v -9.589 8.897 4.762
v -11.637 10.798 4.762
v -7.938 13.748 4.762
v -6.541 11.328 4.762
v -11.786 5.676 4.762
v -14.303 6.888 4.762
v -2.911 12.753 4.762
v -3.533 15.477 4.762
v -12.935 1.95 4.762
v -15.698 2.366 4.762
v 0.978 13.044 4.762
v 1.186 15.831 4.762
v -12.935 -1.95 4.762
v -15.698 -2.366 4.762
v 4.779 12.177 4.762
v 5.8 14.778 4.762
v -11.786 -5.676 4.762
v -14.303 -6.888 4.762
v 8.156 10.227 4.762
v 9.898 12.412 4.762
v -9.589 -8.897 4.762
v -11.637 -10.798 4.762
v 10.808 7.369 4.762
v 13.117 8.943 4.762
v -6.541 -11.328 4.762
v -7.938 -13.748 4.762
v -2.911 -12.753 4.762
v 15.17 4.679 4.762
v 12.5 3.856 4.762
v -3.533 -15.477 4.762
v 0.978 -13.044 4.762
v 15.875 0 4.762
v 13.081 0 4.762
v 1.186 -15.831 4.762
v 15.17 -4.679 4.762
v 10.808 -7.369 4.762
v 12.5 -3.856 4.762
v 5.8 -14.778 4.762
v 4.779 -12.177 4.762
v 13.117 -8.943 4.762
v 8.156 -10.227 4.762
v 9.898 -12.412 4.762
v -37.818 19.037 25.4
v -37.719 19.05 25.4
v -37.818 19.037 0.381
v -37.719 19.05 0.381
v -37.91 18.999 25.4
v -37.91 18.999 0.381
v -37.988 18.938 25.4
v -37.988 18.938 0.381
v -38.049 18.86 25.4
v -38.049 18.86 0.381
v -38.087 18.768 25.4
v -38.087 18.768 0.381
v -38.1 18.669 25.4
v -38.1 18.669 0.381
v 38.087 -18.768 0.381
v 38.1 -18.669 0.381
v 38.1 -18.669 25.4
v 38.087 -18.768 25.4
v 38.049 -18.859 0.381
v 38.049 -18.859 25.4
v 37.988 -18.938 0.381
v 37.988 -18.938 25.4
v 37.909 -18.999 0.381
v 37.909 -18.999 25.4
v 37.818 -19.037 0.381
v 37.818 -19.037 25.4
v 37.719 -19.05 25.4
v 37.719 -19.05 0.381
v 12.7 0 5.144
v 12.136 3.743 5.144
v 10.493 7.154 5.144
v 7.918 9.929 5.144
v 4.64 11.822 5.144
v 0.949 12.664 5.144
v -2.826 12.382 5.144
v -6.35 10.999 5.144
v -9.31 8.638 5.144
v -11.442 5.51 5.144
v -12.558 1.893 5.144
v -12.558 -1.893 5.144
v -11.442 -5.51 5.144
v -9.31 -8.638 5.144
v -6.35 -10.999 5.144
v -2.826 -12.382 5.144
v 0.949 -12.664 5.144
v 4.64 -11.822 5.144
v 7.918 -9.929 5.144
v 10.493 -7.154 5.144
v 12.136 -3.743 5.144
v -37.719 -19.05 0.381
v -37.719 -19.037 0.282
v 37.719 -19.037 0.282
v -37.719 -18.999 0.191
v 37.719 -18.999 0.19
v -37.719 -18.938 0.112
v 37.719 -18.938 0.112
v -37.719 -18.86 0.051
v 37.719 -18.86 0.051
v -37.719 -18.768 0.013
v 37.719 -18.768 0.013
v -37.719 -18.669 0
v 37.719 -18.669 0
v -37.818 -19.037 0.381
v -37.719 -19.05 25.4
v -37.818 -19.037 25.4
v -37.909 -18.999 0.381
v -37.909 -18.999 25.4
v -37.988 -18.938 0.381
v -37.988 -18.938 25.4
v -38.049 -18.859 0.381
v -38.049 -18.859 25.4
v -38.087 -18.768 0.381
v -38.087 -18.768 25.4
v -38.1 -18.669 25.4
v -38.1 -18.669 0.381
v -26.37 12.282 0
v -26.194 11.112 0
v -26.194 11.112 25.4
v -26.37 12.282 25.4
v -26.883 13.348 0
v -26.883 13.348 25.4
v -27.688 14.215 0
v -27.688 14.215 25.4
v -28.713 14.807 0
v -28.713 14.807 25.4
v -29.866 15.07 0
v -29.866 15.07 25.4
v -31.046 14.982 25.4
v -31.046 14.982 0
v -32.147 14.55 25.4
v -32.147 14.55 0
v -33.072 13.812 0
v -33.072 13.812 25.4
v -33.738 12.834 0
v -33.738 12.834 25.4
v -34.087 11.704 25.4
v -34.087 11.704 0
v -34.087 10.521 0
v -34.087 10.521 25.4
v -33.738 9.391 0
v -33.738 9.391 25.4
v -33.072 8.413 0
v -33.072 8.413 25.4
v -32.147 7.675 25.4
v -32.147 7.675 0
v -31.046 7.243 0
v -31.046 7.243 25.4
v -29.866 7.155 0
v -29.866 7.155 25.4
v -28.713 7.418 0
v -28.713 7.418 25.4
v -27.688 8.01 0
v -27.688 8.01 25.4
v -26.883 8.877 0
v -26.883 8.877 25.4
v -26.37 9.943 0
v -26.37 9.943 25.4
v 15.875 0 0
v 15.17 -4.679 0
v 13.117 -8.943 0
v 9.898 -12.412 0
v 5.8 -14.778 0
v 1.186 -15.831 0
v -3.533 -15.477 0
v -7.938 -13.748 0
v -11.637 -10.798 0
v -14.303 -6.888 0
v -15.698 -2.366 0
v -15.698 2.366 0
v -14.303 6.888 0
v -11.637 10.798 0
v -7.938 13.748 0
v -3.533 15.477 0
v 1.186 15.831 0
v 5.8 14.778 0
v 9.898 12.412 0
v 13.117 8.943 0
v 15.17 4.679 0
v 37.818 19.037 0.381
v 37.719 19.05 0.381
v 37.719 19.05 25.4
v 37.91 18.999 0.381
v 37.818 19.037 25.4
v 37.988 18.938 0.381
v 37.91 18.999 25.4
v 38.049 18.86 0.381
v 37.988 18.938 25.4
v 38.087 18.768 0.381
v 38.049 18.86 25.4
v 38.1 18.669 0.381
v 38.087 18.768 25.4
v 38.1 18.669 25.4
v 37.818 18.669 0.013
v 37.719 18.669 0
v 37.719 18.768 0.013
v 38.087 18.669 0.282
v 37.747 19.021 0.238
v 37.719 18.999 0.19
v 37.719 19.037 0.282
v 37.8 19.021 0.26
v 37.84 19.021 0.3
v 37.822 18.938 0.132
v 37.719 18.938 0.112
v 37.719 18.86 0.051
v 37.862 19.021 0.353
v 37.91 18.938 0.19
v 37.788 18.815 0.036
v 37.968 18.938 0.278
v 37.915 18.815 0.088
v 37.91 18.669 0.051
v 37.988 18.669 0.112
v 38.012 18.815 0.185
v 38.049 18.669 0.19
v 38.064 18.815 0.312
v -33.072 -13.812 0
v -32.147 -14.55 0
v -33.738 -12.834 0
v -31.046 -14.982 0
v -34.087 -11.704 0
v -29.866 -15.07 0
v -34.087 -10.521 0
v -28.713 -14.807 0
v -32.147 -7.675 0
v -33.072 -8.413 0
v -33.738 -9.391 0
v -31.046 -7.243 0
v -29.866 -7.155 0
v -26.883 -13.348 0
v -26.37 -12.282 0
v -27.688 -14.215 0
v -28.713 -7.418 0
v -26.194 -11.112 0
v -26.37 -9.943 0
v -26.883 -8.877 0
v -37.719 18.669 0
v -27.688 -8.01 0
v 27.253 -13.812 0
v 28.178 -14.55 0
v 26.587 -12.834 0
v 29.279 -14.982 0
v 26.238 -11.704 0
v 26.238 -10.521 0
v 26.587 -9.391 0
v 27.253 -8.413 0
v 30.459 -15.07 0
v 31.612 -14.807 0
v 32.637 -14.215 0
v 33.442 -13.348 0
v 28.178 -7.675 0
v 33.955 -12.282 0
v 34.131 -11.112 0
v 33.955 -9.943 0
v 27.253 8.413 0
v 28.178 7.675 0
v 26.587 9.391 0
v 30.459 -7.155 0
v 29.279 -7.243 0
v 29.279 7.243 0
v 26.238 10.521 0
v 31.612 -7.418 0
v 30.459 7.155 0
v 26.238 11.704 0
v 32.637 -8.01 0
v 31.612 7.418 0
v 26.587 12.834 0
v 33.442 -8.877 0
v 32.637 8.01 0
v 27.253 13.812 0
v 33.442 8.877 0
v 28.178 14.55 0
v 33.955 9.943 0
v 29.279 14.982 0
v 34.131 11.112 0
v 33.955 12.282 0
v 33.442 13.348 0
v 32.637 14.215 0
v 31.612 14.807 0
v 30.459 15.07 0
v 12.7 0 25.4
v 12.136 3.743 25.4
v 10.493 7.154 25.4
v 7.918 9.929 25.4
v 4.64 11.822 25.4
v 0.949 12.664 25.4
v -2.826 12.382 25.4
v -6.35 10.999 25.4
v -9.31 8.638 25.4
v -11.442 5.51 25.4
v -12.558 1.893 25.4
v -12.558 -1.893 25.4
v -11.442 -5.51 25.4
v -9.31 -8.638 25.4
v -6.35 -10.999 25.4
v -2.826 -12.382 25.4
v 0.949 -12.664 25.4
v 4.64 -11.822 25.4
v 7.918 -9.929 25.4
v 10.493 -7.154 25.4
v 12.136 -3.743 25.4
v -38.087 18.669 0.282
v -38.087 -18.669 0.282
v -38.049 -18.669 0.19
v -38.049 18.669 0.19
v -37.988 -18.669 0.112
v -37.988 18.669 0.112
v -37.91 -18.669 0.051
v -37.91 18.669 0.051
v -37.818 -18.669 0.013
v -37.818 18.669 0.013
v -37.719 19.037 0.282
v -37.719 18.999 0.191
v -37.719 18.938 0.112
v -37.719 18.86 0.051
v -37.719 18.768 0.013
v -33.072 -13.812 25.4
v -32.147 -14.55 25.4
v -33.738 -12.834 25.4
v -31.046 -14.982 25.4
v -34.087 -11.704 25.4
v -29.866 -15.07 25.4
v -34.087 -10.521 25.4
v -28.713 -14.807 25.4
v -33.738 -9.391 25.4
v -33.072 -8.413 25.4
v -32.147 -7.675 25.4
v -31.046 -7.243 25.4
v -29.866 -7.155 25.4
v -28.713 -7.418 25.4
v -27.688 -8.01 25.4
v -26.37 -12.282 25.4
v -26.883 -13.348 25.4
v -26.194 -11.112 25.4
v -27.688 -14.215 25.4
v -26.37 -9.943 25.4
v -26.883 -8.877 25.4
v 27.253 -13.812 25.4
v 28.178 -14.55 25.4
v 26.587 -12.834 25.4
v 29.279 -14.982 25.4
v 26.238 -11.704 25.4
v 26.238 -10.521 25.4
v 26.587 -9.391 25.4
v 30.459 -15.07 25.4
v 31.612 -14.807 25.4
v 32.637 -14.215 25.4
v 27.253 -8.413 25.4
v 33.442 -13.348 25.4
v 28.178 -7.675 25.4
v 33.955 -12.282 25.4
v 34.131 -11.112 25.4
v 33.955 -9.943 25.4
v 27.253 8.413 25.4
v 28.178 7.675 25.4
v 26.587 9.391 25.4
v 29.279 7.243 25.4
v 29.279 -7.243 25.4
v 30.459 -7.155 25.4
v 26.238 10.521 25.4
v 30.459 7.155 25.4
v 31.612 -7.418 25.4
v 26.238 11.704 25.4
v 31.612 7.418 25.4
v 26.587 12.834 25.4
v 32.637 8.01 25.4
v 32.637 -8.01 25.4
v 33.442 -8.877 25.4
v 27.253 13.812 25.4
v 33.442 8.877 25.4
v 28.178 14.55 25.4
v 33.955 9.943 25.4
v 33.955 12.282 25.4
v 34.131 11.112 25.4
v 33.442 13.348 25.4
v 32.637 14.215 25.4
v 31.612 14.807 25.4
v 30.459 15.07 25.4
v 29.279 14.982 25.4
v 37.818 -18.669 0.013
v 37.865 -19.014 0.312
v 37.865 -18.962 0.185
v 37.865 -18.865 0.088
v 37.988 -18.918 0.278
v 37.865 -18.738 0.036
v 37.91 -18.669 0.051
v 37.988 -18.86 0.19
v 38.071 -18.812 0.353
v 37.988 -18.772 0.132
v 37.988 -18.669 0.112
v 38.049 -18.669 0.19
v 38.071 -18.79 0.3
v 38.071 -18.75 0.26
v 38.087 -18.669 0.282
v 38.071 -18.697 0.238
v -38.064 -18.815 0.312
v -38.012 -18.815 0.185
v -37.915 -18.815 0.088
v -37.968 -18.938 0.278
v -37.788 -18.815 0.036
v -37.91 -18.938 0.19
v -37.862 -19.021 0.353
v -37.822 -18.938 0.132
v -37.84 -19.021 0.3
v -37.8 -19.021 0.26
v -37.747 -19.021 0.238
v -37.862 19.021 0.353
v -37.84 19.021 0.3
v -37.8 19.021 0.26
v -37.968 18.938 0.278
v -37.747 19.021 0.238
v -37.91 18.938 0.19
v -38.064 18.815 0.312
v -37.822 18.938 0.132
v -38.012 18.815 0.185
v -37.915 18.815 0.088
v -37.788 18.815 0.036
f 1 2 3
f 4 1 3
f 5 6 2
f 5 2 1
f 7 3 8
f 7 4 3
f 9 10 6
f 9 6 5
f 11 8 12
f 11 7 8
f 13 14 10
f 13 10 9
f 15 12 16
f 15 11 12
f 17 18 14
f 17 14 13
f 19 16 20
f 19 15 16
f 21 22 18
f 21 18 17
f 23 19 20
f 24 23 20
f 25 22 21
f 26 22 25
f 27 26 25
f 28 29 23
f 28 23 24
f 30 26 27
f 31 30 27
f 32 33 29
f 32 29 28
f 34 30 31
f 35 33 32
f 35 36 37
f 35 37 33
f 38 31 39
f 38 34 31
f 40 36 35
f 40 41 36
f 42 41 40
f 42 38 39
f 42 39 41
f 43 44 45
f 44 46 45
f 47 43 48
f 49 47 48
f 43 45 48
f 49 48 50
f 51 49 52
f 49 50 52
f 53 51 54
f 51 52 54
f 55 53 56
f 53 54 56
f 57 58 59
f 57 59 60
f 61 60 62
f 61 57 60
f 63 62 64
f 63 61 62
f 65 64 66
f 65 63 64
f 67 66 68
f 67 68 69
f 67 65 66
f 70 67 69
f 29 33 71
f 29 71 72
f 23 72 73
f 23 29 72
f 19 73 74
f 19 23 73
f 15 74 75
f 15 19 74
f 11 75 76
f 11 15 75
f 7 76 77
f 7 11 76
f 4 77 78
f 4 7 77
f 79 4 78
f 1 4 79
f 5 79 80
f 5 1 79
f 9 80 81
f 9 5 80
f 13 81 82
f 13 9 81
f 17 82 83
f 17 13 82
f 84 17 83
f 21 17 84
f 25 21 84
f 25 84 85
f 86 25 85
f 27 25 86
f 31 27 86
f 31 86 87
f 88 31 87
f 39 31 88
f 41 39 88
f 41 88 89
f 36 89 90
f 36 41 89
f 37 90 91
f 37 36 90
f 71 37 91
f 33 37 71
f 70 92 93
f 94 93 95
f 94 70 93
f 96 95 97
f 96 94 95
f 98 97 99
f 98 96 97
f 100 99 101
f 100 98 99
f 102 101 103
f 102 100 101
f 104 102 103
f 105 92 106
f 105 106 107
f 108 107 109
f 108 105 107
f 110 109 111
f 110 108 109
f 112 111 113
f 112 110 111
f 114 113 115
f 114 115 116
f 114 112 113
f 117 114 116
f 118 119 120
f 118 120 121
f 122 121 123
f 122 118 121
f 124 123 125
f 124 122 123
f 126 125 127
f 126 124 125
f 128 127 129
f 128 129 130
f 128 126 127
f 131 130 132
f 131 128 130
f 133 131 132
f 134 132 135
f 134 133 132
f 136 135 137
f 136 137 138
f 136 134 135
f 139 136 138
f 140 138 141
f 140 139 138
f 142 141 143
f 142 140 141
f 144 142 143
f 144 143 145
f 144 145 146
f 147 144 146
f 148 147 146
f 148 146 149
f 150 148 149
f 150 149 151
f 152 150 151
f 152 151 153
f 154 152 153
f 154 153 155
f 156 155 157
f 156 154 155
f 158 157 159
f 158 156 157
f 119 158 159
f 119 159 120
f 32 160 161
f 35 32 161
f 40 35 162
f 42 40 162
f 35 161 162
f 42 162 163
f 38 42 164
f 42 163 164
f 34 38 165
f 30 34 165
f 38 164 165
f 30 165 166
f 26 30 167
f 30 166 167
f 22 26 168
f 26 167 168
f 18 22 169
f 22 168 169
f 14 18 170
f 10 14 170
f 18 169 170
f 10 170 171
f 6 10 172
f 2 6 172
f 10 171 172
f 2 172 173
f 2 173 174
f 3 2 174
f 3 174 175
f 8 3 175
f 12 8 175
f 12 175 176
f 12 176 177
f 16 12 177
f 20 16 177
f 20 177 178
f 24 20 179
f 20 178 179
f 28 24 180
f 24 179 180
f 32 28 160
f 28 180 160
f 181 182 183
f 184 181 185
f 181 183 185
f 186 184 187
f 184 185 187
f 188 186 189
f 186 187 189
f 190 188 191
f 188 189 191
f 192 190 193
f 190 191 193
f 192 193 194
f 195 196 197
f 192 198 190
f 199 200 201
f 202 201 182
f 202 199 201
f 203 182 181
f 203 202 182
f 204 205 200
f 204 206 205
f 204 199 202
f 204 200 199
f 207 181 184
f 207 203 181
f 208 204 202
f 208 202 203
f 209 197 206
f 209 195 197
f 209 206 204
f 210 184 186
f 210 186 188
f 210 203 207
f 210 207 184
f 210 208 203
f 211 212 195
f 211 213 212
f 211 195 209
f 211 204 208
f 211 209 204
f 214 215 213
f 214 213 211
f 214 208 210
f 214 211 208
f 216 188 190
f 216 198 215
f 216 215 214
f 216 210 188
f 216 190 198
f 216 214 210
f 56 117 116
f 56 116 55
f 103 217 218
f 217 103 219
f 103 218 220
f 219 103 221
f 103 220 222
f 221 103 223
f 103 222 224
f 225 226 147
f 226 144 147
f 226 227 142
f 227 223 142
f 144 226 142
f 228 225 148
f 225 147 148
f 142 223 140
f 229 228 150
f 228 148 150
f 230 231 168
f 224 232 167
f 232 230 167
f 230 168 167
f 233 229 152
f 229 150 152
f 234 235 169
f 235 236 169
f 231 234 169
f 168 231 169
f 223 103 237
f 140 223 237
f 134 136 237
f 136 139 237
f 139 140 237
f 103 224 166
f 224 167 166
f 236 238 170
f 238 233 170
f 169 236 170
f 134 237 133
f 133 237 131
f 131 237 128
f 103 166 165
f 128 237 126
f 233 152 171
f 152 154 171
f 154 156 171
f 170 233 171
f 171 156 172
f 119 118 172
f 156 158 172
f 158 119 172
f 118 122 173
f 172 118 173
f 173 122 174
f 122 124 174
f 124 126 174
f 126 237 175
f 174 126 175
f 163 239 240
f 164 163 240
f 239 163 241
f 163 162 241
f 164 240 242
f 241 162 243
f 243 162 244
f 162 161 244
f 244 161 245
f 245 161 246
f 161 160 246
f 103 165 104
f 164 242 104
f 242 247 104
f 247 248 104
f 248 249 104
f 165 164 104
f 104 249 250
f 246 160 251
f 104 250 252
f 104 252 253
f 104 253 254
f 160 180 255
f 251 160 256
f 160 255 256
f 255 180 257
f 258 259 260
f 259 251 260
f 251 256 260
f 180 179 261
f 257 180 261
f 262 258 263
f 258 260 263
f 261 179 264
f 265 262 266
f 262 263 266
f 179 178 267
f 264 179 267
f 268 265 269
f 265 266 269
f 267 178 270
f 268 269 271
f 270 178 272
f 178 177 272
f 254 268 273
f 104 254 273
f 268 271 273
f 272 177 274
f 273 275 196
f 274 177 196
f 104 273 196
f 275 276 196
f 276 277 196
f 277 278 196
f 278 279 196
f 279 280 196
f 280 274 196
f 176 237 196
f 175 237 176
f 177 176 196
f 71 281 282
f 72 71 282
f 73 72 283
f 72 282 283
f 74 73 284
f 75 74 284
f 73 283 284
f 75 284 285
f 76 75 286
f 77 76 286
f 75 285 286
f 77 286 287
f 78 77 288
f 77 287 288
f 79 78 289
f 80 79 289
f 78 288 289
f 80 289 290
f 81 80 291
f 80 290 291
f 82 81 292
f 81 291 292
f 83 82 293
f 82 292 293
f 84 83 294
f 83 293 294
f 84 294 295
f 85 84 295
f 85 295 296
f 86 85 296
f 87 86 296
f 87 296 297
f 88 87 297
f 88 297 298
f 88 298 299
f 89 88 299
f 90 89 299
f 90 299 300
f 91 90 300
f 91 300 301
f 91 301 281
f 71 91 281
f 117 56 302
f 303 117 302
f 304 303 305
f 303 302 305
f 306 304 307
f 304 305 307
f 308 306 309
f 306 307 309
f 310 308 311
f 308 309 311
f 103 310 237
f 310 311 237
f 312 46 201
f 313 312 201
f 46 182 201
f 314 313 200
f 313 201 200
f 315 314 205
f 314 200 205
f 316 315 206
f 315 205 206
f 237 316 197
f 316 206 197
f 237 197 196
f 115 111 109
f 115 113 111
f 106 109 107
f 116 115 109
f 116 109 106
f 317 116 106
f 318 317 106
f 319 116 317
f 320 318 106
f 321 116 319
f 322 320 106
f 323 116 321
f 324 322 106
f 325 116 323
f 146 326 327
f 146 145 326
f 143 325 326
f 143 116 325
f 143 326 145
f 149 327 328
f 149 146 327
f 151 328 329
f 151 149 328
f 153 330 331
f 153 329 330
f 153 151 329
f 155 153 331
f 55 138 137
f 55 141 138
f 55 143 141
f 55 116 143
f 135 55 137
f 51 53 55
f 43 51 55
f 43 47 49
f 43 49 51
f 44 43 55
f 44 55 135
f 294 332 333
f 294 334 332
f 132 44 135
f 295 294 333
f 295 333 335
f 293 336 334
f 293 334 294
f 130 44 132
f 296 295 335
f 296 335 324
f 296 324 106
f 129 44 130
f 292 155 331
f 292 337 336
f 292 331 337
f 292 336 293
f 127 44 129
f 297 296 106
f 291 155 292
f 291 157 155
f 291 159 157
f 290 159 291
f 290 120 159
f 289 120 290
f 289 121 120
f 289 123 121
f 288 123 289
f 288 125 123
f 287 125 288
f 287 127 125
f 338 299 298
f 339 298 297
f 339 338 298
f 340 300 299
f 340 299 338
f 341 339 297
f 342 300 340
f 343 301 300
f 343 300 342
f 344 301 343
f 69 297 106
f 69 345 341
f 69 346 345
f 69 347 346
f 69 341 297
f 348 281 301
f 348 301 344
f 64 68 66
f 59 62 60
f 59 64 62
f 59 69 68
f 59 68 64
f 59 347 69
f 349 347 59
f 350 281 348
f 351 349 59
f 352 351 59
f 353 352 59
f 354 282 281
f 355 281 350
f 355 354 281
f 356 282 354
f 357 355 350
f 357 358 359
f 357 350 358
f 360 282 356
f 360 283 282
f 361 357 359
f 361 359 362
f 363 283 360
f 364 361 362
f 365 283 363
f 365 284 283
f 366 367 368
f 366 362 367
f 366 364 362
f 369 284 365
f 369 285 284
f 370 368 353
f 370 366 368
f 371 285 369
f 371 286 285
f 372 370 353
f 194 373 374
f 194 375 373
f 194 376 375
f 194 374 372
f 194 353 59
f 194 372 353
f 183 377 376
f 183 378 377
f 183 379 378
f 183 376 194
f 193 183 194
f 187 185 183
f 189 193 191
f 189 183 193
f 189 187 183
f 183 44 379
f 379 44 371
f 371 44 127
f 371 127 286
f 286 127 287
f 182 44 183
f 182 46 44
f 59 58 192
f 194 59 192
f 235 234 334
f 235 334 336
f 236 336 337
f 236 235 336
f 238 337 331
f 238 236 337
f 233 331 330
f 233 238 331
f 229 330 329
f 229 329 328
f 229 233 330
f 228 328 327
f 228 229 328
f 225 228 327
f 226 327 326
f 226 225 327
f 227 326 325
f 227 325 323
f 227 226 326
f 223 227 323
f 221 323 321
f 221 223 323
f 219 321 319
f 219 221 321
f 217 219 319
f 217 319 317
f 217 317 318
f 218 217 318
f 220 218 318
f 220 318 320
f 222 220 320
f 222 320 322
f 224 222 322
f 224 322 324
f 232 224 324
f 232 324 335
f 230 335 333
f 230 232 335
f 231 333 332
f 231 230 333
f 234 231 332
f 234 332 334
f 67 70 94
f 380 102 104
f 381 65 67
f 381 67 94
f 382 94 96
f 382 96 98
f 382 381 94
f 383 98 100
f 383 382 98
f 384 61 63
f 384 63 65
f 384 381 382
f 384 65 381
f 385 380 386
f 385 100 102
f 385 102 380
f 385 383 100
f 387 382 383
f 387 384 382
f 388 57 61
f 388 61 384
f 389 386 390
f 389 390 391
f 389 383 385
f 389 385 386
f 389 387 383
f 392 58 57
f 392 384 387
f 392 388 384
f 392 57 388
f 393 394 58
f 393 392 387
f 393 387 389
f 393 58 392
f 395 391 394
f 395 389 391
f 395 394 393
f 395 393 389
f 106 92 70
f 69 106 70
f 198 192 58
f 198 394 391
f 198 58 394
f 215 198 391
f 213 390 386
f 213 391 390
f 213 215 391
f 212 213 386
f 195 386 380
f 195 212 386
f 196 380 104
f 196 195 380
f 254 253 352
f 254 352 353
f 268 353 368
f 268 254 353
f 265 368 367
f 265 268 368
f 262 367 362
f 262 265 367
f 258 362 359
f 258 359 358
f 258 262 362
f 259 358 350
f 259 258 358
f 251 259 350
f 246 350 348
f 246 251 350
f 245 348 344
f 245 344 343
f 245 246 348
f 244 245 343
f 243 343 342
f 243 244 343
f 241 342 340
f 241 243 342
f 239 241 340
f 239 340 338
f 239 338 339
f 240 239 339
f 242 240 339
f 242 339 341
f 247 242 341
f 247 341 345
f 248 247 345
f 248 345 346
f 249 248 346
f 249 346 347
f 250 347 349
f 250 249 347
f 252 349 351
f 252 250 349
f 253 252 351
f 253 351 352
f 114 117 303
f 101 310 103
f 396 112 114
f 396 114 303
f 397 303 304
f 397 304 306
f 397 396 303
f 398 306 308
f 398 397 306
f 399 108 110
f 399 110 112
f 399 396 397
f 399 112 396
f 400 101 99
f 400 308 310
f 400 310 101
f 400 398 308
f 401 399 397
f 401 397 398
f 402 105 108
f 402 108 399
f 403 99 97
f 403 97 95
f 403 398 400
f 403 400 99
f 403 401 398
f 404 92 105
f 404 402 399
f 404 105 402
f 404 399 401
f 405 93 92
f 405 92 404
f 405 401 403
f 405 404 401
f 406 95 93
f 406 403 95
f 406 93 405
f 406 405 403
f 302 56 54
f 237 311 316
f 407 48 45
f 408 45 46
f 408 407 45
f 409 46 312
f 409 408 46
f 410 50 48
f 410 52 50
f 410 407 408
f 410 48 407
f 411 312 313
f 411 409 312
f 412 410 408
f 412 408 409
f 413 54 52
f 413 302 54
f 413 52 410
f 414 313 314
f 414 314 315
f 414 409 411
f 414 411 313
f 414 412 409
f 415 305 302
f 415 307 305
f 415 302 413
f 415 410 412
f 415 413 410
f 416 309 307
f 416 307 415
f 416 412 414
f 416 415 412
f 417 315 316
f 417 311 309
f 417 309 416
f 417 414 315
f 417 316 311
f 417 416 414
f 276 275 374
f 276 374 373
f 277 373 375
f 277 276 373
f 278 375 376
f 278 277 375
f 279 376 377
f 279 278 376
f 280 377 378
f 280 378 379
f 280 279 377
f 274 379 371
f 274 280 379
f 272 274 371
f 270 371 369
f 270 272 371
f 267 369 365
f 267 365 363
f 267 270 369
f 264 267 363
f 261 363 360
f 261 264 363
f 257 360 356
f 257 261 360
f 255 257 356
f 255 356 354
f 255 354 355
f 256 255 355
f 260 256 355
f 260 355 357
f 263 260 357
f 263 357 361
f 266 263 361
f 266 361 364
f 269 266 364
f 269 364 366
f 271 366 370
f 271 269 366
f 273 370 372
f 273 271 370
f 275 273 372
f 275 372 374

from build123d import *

# Parameters (mm, degrees)
F0_W         = 76.2
F0_H         = 38.1
F0_R         = 3.96875
F1_DEPTH     = 25.4
F2_R         = 0.381
F3_R         = 0.381
F4_T1_DEPTH  = 25.9715
F4_S5_W      = 0.381
F4_S5_H      = 0.381
F4_T6_DEPTH  = 0.381
F4_S11_W     = 0.381
F4_S11_H     = 0.381
F4_T12_DEPTH = 0.381
F5_R         = 12.7
F6_DEPTH     = 25.4
F7_R         = 15.875
F8_DEPTH     = 4.7625
F9_SIZE      = 0.381


# Not quite as in the source:
# - a fillet or chamfer that OpenCascade refuses, or shapes differently, is made with other operations: its cross-section is extruded or revolved along the edge and cut away or added


with BuildPart() as f1:
    # F0 (on Top) → F1 (new body)
    with BuildSketch(Plane.XY):
        Rectangle(F0_W, F0_H)
        with Locations((-30.1625, -11.1125)):
            Circle(F0_R, mode=Mode.SUBTRACT)
        with Locations((30.1625, -11.1125)):
            Circle(F0_R, mode=Mode.SUBTRACT)
        with Locations((-30.1625, 11.1125)):
            Circle(F0_R, mode=Mode.SUBTRACT)
        with Locations((30.1625, 11.1125)):
            Circle(F0_R, mode=Mode.SUBTRACT)
    extrude(amount=F1_DEPTH)

    # F2
    f2_edges = [f1.edges().sort_by_distance(p)[0] for p in [
        (0, -19.05, 0),
        (38.1, 0, 0),
        (-38.1, 0, 0),
    ]]
    fillet(f2_edges, radius=F2_R)

    # F3
    f3_edges = [f1.edges().sort_by_distance(p)[0] for p in [
        (0, 19.05, 0),
    ]]
    fillet(f3_edges, radius=F3_R)

    # F4: fillet of radius 0.381 on 3 edges, made by hand

    # F4_s2 → F4_t1 (cut)
    with BuildSketch(Plane.XY.offset(0.381)):
        with BuildLine():
            ThreePointArc((38.1, -18.669), (37.9884076836, -18.9384076836), (37.719, -19.05))
            Line((37.719, -19.05), (38.1, -19.05))
            Line((38.1, -19.05), (38.1, -18.669))
        make_face()
        with BuildLine():
            ThreePointArc((-37.719, -19.05), (-37.9884076836, -18.9384076836), (-38.1, -18.669))
            Line((-38.1, -18.669), (-38.1, -19.05))
            Line((-38.1, -19.05), (-37.719, -19.05))
        make_face()
    extrude(amount=F4_T1_DEPTH, mode=Mode.SUBTRACT)


with BuildPart() as f4_tool4:
    # F4_s5 → F4_t6 (new body)
    with BuildSketch(Plane.XZ.offset(18.669)):
        with Locations((-37.9095, 0.1905)):
            Rectangle(F4_S5_W, F4_S5_H)
    extrude(amount=F4_T6_DEPTH)

    # F4_s7 → F4_t8 (revolve, cut)
    with BuildSketch(Plane(origin=(-37.719, -18.669, 0.381), x_dir=(0.7071067812, 0, 0.7071067812), z_dir=(0.7071067812, 0, -0.7071067812))):
        with BuildLine():
            ThreePointArc((0, -0.381), (0.381, 0), (0, 0.381))
            Line((0, 0.381), (0, -0.381))
        make_face()
    revolve(axis=Axis((-37.719, -18.669, 0.381), (0, -1, 0)), mode=Mode.SUBTRACT)


with BuildPart() as f1_1:
    add(f1.part)

    # F4_t3: cut F4_tool4
    add(f4_tool4.part, mode=Mode.SUBTRACT)


with BuildPart() as f4_tool10:
    # F4_s11 → F4_t12 (new body)
    with BuildSketch(Plane.YZ.offset(37.719)):
        with Locations((-18.8595, 0.1905)):
            Rectangle(F4_S11_W, F4_S11_H)
    extrude(amount=F4_T12_DEPTH)

    # F4_s13 → F4_t14 (revolve, cut)
    with BuildSketch(Plane(origin=(37.719, -18.669, 0.381), x_dir=(0, 0.7071067812, 0.7071067812), z_dir=(0, 0.7071067812, -0.7071067812))):
        with BuildLine():
            ThreePointArc((0, -0.381), (0.381, 0), (0, 0.381))
            Line((0, 0.381), (0, -0.381))
        make_face()
    revolve(axis=Axis((37.719, -18.669, 0.381), (1, 0, 0)), mode=Mode.SUBTRACT)


with BuildPart() as f1_2:
    add(f1_1.part)

    # F4_t9: cut F4_tool10
    add(f4_tool10.part, mode=Mode.SUBTRACT)

    # F5 (on face) → F6 (cut)
    with BuildSketch(Plane.XY.offset(25.4)):
        Circle(F5_R)
    extrude(amount=-F6_DEPTH, mode=Mode.SUBTRACT)

    # F7 (on face) → F8 (cut)
    with BuildSketch(Plane(origin=(0, 0, 0), x_dir=(1, 0, 0), z_dir=(0, 0, -1))):
        Circle(F7_R)
    extrude(amount=-F8_DEPTH, mode=Mode.SUBTRACT)

    # F9
    f9_edges = [f1_2.edges().sort_by_distance(p)[0] for p in [
        (-12.7, 0, 4.7625),
    ]]
    chamfer(f9_edges, length=F9_SIZE)


solid = f1_2.part
